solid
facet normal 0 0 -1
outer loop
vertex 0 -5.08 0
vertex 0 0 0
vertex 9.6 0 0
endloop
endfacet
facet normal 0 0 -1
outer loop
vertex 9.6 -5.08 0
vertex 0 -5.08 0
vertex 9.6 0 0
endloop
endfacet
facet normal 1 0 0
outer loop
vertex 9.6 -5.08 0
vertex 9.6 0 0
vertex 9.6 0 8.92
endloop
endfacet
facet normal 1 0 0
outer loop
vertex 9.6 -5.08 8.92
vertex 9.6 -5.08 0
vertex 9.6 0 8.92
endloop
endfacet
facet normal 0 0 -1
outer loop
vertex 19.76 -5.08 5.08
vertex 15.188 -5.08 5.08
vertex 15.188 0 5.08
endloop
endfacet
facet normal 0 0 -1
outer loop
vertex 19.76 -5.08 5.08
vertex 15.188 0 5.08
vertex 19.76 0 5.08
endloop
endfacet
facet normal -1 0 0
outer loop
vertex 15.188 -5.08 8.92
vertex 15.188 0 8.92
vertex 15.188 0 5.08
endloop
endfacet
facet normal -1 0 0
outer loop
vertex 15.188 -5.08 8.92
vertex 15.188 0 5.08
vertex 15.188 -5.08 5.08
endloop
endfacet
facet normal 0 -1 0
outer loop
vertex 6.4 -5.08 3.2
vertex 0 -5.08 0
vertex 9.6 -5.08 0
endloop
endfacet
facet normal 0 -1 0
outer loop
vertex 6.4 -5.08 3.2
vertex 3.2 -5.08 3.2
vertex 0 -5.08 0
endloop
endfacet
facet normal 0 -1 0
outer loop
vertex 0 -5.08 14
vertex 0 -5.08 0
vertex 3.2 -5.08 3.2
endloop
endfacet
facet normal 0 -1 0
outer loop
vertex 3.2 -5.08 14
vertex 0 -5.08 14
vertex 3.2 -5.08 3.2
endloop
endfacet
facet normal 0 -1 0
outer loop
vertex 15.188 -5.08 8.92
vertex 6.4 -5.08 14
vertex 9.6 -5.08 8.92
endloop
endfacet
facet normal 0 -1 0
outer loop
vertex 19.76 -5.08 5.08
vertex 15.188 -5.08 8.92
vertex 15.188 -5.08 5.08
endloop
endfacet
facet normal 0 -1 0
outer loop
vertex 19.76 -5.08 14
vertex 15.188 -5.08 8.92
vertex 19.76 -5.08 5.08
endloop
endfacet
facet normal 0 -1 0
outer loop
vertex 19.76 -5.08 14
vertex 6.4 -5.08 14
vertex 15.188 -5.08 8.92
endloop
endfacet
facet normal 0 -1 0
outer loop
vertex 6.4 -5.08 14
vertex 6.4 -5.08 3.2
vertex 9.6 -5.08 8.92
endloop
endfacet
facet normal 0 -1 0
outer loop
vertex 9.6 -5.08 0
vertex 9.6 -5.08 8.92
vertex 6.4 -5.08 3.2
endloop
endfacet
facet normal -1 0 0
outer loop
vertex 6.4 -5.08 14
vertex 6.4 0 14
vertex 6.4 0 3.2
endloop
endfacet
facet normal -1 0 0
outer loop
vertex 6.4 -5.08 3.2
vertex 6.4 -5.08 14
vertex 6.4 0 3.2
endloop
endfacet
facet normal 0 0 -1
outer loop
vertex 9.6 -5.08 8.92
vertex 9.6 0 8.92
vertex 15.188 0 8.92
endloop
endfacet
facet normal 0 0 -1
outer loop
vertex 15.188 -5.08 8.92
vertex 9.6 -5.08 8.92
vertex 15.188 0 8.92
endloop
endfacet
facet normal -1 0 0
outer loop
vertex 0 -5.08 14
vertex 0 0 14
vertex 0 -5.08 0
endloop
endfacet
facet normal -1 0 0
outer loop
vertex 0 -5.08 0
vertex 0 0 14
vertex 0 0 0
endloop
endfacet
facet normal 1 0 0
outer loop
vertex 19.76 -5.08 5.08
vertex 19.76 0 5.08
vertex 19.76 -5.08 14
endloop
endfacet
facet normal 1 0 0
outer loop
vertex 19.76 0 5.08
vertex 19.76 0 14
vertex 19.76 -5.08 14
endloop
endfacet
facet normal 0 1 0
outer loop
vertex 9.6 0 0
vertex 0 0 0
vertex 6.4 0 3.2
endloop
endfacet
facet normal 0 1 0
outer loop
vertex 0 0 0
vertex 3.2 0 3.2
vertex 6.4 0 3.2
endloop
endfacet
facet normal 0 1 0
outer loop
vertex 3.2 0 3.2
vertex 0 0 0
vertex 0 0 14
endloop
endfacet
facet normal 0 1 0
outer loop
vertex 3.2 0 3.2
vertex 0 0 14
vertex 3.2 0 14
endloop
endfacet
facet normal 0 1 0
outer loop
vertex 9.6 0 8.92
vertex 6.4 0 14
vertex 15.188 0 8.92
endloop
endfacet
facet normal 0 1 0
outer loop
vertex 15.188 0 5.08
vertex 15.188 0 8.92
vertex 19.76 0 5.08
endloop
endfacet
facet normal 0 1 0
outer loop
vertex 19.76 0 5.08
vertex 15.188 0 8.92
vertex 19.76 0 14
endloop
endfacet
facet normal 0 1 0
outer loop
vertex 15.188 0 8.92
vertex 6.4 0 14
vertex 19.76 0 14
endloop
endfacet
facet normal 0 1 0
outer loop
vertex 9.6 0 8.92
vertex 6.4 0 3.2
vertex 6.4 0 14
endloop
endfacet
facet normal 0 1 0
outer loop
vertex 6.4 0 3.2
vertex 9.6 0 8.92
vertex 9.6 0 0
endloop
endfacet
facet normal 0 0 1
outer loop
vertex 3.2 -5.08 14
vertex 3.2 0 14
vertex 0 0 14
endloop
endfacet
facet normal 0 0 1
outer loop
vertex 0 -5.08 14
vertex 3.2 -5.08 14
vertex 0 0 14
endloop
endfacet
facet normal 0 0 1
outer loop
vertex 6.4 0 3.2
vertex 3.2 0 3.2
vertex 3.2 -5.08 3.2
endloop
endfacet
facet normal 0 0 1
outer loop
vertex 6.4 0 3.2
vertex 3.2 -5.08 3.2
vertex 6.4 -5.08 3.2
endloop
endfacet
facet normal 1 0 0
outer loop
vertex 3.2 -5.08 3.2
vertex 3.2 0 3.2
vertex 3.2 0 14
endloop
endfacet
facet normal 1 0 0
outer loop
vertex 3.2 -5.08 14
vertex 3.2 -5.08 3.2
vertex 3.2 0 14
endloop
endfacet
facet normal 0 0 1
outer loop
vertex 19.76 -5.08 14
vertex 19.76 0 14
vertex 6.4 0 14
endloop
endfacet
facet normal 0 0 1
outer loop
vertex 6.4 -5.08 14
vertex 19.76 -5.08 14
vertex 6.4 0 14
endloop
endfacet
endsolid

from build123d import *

# Parameters (mm, degrees)
F0_W     = 10.16
F0_H     = 5.08
F0_W_2   = 3.2
F0_H_2   = 3.2
F1_DEPTH = 5.08
F2_W     = 4.572
F2_H     = 5.08
F3_DEPTH = 3.84


with BuildPart() as f1:
    # F0 (on Front) → F1 (new body)
    with BuildSketch(Plane.XZ):
        with Locations((14.68, 11.46)):
            Rectangle(F0_W, F0_H)
        with BuildLine():
            ThreePointArc((0, 1.27), (0.371974, 0.371974), (1.27, 0))
            Line((1.27, 0), (3.2, 0))
            Line((3.2, 0), (3.2, 3.2))
            Line((3.2, 3.2), (3.2, 10.8))
            Line((3.2, 10.8), (0, 10.8))
            Line((0, 10.8), (0, 1.27))
        make_face()
        with Locations((4.8, 1.6)):
            Rectangle(F0_W_2, F0_H_2)
        with BuildLine():
            Line((6.4, 3.2), (6.4, 0))
            Line((6.4, 0), (8.33, 0))
            ThreePointArc((8.33, 0), (9.228026, 0.371974), (9.6, 1.27))
            Line((9.6, 1.27), (9.6, 8.92))
            Line((9.6, 8.92), (9.6, 14))
            Line((9.6, 14), (6.4, 14))
            Line((6.4, 14), (6.4, 3.2))
        make_face()
        with BuildLine():
            Line((0, 0), (1.27, 0))
            ThreePointArc((1.27, 0), (0.371974, 0.371974), (0, 1.27))
            Line((0, 1.27), (0, 0))
        make_face()
        with BuildLine():
            ThreePointArc((9.6, 1.27), (9.228026, 0.371974), (8.33, 0))
            Line((8.33, 0), (9.6, 0))
            Line((9.6, 0), (9.6, 1.27))
        make_face()
        with BuildLine():
            Line((0, 12.73), (0, 10.8))
            Line((0, 10.8), (3.2, 10.8))
            Line((3.2, 10.8), (3.2, 14))
            Line((3.2, 14), (1.27, 14))
            ThreePointArc((1.27, 14), (0.371974, 13.628026), (0, 12.73))
        make_face()
        with BuildLine():
            Line((0, 14), (0, 12.73))
            ThreePointArc((0, 12.73), (0.371974, 13.628026), (1.27, 14))
            Line((1.27, 14), (0, 14))
        make_face()
    extrude(amount=F1_DEPTH)

    # F2 (on face) → F3 (join)
    with BuildSketch(Plane(origin=(0, 0, 8.92), x_dir=(1, 0, 0), z_dir=(0, 0, -1))):
        with Locations((17.474, 2.54)):
            Rectangle(F2_W, F2_H)
    extrude(amount=F3_DEPTH)


solid = f1.part
